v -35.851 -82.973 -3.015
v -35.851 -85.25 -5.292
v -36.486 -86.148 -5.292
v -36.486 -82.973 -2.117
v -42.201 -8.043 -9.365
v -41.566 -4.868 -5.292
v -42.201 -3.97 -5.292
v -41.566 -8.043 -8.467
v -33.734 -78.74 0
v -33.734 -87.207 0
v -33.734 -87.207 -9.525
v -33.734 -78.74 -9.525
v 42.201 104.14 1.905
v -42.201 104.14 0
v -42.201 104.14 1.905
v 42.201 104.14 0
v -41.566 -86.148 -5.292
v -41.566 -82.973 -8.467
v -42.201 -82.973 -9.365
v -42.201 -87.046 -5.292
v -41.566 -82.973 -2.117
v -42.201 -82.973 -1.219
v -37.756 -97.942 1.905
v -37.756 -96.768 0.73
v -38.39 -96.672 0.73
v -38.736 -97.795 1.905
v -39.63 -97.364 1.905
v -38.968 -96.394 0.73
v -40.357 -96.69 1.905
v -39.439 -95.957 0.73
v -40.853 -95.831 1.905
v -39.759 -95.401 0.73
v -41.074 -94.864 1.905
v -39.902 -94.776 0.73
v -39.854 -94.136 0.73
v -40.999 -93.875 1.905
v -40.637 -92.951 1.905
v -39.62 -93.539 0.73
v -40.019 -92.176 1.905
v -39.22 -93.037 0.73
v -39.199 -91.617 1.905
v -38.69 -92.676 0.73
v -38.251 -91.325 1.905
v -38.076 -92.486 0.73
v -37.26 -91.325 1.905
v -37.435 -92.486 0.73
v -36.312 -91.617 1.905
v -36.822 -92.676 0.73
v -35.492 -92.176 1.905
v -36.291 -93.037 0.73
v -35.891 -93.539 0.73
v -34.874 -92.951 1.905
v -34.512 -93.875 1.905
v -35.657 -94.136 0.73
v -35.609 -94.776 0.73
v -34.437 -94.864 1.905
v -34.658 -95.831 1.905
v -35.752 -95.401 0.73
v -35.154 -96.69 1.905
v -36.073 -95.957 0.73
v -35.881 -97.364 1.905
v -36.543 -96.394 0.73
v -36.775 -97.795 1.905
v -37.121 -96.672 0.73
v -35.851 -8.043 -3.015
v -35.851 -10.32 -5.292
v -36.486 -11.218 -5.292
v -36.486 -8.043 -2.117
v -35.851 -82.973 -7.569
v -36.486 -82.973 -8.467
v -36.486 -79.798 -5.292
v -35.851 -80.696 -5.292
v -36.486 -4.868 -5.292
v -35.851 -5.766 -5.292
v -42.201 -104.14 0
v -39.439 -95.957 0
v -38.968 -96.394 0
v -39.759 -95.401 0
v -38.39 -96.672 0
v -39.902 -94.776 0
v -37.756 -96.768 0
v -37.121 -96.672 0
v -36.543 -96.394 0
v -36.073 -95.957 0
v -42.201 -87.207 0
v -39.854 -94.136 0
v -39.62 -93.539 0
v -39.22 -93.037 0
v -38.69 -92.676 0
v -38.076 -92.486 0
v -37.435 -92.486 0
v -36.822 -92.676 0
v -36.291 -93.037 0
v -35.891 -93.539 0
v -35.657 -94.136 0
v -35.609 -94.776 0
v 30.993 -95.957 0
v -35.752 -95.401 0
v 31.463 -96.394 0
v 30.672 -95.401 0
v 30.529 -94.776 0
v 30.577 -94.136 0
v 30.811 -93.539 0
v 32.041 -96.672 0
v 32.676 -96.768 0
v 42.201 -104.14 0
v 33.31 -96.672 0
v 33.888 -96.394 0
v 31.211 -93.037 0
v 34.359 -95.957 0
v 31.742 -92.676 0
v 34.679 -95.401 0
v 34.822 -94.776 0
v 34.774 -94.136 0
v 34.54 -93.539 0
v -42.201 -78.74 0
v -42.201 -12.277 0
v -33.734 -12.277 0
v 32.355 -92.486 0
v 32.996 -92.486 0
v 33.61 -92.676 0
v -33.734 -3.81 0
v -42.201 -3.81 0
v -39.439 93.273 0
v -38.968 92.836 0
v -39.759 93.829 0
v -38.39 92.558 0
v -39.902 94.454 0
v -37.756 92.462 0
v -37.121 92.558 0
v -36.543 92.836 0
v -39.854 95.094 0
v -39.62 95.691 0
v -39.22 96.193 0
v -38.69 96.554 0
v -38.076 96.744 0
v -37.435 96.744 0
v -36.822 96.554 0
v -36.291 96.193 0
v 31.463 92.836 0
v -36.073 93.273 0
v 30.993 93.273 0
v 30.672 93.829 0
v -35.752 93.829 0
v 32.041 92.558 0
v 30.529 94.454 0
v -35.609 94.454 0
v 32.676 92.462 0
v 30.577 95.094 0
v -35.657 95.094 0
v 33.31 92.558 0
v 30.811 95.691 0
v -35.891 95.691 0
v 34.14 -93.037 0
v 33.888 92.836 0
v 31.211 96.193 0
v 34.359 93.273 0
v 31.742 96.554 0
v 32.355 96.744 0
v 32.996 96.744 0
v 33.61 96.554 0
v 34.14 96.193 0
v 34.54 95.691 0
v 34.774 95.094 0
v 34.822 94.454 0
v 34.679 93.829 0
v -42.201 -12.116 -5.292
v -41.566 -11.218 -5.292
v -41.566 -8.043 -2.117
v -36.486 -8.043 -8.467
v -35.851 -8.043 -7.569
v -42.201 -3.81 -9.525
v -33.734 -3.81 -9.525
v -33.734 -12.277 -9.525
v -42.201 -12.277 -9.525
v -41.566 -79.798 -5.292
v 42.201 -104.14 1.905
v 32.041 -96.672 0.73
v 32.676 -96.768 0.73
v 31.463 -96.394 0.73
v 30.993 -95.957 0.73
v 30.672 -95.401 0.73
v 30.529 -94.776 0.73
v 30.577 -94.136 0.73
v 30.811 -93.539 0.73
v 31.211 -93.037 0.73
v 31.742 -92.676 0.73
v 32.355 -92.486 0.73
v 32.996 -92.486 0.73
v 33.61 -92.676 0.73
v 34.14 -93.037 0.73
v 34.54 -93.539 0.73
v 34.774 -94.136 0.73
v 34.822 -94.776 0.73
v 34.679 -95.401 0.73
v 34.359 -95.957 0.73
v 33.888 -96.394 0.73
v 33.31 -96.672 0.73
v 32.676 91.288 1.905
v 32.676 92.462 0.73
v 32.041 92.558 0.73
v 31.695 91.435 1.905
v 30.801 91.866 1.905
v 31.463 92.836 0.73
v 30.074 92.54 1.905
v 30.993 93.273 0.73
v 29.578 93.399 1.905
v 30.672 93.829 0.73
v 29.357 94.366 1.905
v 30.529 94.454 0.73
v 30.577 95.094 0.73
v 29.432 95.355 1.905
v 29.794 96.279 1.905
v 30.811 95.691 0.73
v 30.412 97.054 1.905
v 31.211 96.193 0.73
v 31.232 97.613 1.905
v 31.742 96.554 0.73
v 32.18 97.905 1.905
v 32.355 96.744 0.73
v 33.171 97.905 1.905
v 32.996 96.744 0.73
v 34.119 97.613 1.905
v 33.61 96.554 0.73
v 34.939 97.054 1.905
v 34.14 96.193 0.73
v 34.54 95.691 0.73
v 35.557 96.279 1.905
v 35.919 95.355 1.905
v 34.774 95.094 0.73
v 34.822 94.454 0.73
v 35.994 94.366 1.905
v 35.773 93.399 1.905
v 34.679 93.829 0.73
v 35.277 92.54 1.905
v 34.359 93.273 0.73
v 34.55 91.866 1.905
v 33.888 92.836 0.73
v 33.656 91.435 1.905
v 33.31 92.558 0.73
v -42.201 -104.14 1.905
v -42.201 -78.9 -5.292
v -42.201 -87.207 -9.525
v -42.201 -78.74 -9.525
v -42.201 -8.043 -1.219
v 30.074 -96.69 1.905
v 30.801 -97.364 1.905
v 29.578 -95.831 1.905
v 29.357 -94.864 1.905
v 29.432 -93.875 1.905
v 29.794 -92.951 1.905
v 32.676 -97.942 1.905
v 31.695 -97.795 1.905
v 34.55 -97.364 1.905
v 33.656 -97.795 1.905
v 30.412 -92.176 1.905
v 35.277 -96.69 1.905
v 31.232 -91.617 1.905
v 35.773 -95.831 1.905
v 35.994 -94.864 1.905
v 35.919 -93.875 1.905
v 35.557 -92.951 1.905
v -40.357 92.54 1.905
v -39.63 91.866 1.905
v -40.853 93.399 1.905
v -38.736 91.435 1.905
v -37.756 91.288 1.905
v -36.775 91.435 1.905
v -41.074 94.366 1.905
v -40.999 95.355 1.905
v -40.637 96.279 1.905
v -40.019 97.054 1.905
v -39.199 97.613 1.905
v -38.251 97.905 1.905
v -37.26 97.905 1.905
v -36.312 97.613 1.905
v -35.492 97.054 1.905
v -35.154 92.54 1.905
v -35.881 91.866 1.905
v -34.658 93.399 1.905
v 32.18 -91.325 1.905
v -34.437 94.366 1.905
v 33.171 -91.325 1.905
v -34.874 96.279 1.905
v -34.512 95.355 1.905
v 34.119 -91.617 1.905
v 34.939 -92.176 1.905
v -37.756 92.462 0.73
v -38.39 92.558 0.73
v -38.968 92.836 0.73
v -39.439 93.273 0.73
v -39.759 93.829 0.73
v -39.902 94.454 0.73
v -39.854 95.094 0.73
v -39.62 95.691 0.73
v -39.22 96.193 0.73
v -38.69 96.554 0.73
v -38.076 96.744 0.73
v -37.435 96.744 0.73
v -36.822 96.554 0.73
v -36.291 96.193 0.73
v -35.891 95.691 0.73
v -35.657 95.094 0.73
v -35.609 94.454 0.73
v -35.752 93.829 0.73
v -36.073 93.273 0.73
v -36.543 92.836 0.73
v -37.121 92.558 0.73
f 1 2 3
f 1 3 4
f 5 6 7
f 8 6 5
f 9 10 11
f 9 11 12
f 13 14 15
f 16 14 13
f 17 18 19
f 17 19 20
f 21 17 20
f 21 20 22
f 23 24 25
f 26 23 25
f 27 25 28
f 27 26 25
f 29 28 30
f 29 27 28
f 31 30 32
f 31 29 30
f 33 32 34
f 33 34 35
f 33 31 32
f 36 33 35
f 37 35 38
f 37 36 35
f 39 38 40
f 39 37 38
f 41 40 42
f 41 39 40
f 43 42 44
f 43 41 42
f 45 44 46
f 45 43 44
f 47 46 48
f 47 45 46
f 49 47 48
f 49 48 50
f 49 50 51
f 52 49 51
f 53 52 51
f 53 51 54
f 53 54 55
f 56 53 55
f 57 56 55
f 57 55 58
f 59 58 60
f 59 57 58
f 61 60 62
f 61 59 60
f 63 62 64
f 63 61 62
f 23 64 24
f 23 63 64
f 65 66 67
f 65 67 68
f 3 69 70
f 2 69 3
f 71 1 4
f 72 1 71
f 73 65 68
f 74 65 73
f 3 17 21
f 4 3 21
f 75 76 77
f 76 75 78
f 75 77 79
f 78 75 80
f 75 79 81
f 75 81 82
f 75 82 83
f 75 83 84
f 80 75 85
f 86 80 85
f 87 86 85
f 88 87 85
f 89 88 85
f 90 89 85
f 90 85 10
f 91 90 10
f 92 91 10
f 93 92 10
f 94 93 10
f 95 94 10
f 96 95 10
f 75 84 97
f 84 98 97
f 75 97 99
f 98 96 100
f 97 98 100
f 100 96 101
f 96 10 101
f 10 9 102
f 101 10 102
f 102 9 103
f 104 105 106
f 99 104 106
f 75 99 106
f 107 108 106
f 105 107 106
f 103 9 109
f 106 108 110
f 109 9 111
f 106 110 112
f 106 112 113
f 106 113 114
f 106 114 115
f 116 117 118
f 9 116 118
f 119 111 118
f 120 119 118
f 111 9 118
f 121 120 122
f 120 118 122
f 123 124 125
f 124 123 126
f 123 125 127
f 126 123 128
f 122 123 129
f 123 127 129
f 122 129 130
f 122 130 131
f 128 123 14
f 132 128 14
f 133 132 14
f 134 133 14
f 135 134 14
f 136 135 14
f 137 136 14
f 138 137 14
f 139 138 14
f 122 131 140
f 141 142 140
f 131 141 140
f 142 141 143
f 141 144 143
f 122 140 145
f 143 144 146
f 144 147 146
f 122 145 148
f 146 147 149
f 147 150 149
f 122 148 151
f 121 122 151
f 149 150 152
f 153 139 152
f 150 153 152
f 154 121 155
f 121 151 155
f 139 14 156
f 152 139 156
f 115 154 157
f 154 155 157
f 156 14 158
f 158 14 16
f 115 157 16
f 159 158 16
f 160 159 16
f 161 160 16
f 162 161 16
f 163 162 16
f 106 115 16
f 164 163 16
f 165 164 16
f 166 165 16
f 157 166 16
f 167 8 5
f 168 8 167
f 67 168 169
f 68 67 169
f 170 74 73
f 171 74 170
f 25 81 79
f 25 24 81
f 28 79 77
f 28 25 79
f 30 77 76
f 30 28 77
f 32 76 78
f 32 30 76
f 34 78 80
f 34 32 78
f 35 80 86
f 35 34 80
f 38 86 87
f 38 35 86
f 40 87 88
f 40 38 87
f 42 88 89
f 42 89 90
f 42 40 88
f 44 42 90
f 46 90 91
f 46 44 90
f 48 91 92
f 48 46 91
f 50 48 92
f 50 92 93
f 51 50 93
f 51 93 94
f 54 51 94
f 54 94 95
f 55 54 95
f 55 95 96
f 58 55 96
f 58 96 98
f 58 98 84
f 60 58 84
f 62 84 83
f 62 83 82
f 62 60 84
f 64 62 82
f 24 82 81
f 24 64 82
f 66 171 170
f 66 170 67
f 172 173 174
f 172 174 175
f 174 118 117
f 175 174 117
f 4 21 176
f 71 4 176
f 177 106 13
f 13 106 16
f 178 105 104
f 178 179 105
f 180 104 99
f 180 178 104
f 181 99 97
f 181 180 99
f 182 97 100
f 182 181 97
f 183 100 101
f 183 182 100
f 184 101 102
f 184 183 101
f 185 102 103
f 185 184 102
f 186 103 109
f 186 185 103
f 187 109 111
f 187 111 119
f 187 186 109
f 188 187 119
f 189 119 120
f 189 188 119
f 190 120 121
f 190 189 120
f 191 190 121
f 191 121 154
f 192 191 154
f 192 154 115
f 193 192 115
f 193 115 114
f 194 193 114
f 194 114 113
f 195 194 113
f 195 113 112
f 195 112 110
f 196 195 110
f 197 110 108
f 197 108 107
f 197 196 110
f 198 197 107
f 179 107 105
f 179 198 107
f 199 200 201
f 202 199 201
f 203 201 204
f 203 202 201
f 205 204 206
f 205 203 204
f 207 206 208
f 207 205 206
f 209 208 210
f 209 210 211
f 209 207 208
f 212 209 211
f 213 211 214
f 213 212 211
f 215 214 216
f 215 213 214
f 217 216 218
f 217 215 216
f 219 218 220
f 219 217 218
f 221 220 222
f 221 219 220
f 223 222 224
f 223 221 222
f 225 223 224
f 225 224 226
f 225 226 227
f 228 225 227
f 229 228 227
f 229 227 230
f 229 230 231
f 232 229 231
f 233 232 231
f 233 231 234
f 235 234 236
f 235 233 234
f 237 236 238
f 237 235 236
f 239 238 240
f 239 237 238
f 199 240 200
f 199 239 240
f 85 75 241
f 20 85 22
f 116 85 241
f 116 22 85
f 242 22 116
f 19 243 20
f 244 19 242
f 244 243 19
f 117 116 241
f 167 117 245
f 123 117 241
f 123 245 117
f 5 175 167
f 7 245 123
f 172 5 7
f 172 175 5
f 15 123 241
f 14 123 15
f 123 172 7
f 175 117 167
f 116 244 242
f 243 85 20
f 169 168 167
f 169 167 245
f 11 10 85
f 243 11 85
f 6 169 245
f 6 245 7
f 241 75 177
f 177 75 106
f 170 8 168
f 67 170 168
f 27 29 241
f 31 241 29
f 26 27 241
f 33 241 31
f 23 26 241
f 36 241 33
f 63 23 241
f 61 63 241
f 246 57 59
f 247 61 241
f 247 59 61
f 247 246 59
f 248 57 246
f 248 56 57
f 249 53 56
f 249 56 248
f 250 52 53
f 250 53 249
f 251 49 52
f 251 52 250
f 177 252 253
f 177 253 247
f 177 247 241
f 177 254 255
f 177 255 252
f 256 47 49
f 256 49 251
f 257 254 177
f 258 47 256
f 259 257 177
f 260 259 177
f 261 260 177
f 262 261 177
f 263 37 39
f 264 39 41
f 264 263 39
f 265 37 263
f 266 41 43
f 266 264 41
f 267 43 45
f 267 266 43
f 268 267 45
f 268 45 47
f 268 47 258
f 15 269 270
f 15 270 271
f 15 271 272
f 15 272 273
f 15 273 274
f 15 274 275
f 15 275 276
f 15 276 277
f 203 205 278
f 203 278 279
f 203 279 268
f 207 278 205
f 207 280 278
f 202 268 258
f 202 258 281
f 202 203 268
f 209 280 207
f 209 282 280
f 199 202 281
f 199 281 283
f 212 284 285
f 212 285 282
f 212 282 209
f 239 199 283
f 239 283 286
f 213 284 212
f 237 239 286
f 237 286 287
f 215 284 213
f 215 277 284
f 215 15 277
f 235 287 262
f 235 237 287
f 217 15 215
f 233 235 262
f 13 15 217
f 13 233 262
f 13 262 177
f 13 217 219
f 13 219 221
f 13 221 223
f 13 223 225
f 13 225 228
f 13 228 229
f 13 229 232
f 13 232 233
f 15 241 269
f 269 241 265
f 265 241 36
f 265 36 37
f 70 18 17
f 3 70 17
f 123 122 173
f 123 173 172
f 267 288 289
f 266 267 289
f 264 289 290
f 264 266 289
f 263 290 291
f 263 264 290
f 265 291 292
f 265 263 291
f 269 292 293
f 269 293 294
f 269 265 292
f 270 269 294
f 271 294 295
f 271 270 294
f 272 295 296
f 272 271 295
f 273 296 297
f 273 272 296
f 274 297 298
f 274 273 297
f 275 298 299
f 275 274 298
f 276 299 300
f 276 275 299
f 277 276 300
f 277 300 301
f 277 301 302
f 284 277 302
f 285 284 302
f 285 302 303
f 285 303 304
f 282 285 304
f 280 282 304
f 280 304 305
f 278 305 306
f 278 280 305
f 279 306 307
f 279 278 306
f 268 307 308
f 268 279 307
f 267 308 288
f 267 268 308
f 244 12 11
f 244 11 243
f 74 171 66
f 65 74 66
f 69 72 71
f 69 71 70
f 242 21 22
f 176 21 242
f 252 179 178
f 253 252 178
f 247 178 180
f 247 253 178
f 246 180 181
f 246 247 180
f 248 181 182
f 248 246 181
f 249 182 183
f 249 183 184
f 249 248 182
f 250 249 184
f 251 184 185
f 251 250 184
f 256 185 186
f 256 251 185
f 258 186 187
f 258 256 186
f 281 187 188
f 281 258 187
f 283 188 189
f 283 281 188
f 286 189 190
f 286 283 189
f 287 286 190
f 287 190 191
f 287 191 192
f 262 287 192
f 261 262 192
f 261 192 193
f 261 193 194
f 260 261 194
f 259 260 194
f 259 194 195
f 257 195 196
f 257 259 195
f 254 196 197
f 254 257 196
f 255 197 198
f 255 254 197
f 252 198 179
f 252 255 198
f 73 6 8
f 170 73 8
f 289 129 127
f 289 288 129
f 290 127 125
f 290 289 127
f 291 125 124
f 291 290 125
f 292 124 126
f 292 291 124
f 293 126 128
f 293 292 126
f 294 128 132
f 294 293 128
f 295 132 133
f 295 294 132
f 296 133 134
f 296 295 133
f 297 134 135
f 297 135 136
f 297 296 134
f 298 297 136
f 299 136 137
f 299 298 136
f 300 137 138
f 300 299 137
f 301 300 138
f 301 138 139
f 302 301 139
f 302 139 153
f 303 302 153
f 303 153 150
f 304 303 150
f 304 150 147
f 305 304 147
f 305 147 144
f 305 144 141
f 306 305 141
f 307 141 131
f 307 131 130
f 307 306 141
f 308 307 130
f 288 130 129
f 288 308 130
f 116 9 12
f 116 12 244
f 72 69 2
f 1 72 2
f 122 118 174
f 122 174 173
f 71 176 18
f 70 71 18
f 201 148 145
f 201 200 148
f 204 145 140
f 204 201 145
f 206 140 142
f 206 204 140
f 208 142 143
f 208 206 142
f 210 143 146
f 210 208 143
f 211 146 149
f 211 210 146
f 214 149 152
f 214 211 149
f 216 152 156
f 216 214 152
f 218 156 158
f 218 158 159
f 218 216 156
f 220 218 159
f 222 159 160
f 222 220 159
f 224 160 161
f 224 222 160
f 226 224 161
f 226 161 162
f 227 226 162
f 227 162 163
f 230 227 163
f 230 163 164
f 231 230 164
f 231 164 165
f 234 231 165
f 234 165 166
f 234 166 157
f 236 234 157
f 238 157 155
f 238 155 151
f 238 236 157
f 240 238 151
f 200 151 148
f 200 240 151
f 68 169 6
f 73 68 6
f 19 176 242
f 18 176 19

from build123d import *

# Parameters (mm, degrees)
SKETCH1_W                      = 84.401025
SKETCH1_H                      = 208.28
BOSS_EXTRUDE1_DEPTH            = 1.905
F_6_CLEARANCE_HOLE1_AT_2_COUNT = 2
F_6_CLEARANCE_HOLE1_AT_2_PITCH = 189.23
F_6_CLEARANCE_HOLE1_AT_3_COUNT = 2
F_6_CLEARANCE_HOLE1_AT_3_PITCH = 201.912164523
F_6_CLEARANCE_HOLE1_AT_4_COUNT = 2
F_6_CLEARANCE_HOLE1_AT_4_PITCH = 70.431025
SKETCH4_W                      = 8.466667
SKETCH4_H                      = 8.466667
BOSS_EXTRUDE2_DEPTH            = 9.525
CUT_EXTRUDE3_DEPTH             = 6.35
CHAMFER1_SIZE                  = 0.635


with BuildPart() as part:
    # Sketch1 → Boss-Extrude1 (new body)
    with BuildSketch(Plane.XY):
        Rectangle(SKETCH1_W, SKETCH1_H)
    extrude(amount=BOSS_EXTRUDE1_DEPTH)

    # Sketch3 → #6 Clearance Hole1 (revolve, cut)
    with BuildSketch(Plane(origin=(-37.7555125, 94.615, 1.905), x_dir=(0, -1, 0), z_dir=(1, 0, 0))):
        Polygon((0, 0), (0, 1.905), (2.15265, 1.905), (2.15265, 1.17475), (3.3274, 0), align=None)
    f_6_clearance_hole1 = revolve(axis=Axis((-37.7555125, 94.615, 8.255), (0, 0, -1)), mode=Mode.SUBTRACT)

    # #6 Clearance Hole1 at 2: #6 Clearance Hole1 ×2
    with Locations(*[(0, -i * F_6_CLEARANCE_HOLE1_AT_2_PITCH, 0) for i in range(1, F_6_CLEARANCE_HOLE1_AT_2_COUNT)]):
        add(f_6_clearance_hole1, mode=Mode.SUBTRACT)

    # #6 Clearance Hole1 at 3: #6 Clearance Hole1 ×2
    with Locations(*[Vector(0.34882011772903904, -0.9371896955619494, 0) * (i * F_6_CLEARANCE_HOLE1_AT_3_PITCH) for i in range(1, F_6_CLEARANCE_HOLE1_AT_3_COUNT)]):
        add(f_6_clearance_hole1, mode=Mode.SUBTRACT)

    # #6 Clearance Hole1 at 4: #6 Clearance Hole1 ×2
    with Locations(*[(i * F_6_CLEARANCE_HOLE1_AT_4_PITCH, 0, 0) for i in range(1, F_6_CLEARANCE_HOLE1_AT_4_COUNT)]):
        add(f_6_clearance_hole1, mode=Mode.SUBTRACT)

    # Sketch4 → Boss-Extrude2 (add)
    with BuildSketch(Plane(origin=(0, 0, 0), x_dir=(-1, 0, 0), z_dir=(0, 0, -1))):
        with Locations((37.967179, -8.0433335)):
            Rectangle(SKETCH4_W, SKETCH4_H)
        with Locations((37.967179, -82.973333082)):
            Rectangle(SKETCH4_W, SKETCH4_H)
    extrude(amount=BOSS_EXTRUDE2_DEPTH)

    # Sketch5 → Cut-Extrude3 (cut)
    with BuildSketch(Plane(origin=(-42.2005125, 0, 0), x_dir=(0, 0, -1), z_dir=(1, 0, 0))):
        Polygon((2.116666667, -82.973333082), (5.291666667, -79.798333082), (8.466666667, -82.973333082), (5.291666667, -86.148333082), align=None)
        Polygon((2.116666667, -8.0433335), (5.291666667, -4.8683335), (8.466666667, -8.0433335), (5.291666667, -11.2183335), align=None)
    extrude(amount=CUT_EXTRUDE3_DEPTH, mode=Mode.SUBTRACT)

    # Chamfer1
    chamfer1_edges = [part.edges().sort_by_distance(p)[0] for p in [
        (-42.2005125, -84.560833082, -3.704166667),
        (-42.2005125, -84.560833082, -6.879166667),
        (-42.2005125, -81.385833082, -6.879166667),
        (-42.2005125, -81.385833082, -3.704166667),
        (-35.8505125, -84.560833082, -3.704166667),
        (-35.8505125, -84.560833082, -6.879166667),
        (-35.8505125, -81.385833082, -6.879166667),
        (-35.8505125, -81.385833082, -3.704166667),
        (-42.2005125, -9.6308335, -3.704166667),
        (-42.2005125, -9.6308335, -6.879166667),
        (-42.2005125, -6.4558335, -6.879166667),
        (-42.2005125, -6.4558335, -3.704166667),
        (-35.8505125, -9.6308335, -3.704166667),
        (-35.8505125, -9.6308335, -6.879166667),
        (-35.8505125, -6.4558335, -6.879166667),
        (-35.8505125, -6.4558335, -3.704166667),
    ]]
    chamfer(chamfer1_edges, length=CHAMFER1_SIZE)


solid = part.part
